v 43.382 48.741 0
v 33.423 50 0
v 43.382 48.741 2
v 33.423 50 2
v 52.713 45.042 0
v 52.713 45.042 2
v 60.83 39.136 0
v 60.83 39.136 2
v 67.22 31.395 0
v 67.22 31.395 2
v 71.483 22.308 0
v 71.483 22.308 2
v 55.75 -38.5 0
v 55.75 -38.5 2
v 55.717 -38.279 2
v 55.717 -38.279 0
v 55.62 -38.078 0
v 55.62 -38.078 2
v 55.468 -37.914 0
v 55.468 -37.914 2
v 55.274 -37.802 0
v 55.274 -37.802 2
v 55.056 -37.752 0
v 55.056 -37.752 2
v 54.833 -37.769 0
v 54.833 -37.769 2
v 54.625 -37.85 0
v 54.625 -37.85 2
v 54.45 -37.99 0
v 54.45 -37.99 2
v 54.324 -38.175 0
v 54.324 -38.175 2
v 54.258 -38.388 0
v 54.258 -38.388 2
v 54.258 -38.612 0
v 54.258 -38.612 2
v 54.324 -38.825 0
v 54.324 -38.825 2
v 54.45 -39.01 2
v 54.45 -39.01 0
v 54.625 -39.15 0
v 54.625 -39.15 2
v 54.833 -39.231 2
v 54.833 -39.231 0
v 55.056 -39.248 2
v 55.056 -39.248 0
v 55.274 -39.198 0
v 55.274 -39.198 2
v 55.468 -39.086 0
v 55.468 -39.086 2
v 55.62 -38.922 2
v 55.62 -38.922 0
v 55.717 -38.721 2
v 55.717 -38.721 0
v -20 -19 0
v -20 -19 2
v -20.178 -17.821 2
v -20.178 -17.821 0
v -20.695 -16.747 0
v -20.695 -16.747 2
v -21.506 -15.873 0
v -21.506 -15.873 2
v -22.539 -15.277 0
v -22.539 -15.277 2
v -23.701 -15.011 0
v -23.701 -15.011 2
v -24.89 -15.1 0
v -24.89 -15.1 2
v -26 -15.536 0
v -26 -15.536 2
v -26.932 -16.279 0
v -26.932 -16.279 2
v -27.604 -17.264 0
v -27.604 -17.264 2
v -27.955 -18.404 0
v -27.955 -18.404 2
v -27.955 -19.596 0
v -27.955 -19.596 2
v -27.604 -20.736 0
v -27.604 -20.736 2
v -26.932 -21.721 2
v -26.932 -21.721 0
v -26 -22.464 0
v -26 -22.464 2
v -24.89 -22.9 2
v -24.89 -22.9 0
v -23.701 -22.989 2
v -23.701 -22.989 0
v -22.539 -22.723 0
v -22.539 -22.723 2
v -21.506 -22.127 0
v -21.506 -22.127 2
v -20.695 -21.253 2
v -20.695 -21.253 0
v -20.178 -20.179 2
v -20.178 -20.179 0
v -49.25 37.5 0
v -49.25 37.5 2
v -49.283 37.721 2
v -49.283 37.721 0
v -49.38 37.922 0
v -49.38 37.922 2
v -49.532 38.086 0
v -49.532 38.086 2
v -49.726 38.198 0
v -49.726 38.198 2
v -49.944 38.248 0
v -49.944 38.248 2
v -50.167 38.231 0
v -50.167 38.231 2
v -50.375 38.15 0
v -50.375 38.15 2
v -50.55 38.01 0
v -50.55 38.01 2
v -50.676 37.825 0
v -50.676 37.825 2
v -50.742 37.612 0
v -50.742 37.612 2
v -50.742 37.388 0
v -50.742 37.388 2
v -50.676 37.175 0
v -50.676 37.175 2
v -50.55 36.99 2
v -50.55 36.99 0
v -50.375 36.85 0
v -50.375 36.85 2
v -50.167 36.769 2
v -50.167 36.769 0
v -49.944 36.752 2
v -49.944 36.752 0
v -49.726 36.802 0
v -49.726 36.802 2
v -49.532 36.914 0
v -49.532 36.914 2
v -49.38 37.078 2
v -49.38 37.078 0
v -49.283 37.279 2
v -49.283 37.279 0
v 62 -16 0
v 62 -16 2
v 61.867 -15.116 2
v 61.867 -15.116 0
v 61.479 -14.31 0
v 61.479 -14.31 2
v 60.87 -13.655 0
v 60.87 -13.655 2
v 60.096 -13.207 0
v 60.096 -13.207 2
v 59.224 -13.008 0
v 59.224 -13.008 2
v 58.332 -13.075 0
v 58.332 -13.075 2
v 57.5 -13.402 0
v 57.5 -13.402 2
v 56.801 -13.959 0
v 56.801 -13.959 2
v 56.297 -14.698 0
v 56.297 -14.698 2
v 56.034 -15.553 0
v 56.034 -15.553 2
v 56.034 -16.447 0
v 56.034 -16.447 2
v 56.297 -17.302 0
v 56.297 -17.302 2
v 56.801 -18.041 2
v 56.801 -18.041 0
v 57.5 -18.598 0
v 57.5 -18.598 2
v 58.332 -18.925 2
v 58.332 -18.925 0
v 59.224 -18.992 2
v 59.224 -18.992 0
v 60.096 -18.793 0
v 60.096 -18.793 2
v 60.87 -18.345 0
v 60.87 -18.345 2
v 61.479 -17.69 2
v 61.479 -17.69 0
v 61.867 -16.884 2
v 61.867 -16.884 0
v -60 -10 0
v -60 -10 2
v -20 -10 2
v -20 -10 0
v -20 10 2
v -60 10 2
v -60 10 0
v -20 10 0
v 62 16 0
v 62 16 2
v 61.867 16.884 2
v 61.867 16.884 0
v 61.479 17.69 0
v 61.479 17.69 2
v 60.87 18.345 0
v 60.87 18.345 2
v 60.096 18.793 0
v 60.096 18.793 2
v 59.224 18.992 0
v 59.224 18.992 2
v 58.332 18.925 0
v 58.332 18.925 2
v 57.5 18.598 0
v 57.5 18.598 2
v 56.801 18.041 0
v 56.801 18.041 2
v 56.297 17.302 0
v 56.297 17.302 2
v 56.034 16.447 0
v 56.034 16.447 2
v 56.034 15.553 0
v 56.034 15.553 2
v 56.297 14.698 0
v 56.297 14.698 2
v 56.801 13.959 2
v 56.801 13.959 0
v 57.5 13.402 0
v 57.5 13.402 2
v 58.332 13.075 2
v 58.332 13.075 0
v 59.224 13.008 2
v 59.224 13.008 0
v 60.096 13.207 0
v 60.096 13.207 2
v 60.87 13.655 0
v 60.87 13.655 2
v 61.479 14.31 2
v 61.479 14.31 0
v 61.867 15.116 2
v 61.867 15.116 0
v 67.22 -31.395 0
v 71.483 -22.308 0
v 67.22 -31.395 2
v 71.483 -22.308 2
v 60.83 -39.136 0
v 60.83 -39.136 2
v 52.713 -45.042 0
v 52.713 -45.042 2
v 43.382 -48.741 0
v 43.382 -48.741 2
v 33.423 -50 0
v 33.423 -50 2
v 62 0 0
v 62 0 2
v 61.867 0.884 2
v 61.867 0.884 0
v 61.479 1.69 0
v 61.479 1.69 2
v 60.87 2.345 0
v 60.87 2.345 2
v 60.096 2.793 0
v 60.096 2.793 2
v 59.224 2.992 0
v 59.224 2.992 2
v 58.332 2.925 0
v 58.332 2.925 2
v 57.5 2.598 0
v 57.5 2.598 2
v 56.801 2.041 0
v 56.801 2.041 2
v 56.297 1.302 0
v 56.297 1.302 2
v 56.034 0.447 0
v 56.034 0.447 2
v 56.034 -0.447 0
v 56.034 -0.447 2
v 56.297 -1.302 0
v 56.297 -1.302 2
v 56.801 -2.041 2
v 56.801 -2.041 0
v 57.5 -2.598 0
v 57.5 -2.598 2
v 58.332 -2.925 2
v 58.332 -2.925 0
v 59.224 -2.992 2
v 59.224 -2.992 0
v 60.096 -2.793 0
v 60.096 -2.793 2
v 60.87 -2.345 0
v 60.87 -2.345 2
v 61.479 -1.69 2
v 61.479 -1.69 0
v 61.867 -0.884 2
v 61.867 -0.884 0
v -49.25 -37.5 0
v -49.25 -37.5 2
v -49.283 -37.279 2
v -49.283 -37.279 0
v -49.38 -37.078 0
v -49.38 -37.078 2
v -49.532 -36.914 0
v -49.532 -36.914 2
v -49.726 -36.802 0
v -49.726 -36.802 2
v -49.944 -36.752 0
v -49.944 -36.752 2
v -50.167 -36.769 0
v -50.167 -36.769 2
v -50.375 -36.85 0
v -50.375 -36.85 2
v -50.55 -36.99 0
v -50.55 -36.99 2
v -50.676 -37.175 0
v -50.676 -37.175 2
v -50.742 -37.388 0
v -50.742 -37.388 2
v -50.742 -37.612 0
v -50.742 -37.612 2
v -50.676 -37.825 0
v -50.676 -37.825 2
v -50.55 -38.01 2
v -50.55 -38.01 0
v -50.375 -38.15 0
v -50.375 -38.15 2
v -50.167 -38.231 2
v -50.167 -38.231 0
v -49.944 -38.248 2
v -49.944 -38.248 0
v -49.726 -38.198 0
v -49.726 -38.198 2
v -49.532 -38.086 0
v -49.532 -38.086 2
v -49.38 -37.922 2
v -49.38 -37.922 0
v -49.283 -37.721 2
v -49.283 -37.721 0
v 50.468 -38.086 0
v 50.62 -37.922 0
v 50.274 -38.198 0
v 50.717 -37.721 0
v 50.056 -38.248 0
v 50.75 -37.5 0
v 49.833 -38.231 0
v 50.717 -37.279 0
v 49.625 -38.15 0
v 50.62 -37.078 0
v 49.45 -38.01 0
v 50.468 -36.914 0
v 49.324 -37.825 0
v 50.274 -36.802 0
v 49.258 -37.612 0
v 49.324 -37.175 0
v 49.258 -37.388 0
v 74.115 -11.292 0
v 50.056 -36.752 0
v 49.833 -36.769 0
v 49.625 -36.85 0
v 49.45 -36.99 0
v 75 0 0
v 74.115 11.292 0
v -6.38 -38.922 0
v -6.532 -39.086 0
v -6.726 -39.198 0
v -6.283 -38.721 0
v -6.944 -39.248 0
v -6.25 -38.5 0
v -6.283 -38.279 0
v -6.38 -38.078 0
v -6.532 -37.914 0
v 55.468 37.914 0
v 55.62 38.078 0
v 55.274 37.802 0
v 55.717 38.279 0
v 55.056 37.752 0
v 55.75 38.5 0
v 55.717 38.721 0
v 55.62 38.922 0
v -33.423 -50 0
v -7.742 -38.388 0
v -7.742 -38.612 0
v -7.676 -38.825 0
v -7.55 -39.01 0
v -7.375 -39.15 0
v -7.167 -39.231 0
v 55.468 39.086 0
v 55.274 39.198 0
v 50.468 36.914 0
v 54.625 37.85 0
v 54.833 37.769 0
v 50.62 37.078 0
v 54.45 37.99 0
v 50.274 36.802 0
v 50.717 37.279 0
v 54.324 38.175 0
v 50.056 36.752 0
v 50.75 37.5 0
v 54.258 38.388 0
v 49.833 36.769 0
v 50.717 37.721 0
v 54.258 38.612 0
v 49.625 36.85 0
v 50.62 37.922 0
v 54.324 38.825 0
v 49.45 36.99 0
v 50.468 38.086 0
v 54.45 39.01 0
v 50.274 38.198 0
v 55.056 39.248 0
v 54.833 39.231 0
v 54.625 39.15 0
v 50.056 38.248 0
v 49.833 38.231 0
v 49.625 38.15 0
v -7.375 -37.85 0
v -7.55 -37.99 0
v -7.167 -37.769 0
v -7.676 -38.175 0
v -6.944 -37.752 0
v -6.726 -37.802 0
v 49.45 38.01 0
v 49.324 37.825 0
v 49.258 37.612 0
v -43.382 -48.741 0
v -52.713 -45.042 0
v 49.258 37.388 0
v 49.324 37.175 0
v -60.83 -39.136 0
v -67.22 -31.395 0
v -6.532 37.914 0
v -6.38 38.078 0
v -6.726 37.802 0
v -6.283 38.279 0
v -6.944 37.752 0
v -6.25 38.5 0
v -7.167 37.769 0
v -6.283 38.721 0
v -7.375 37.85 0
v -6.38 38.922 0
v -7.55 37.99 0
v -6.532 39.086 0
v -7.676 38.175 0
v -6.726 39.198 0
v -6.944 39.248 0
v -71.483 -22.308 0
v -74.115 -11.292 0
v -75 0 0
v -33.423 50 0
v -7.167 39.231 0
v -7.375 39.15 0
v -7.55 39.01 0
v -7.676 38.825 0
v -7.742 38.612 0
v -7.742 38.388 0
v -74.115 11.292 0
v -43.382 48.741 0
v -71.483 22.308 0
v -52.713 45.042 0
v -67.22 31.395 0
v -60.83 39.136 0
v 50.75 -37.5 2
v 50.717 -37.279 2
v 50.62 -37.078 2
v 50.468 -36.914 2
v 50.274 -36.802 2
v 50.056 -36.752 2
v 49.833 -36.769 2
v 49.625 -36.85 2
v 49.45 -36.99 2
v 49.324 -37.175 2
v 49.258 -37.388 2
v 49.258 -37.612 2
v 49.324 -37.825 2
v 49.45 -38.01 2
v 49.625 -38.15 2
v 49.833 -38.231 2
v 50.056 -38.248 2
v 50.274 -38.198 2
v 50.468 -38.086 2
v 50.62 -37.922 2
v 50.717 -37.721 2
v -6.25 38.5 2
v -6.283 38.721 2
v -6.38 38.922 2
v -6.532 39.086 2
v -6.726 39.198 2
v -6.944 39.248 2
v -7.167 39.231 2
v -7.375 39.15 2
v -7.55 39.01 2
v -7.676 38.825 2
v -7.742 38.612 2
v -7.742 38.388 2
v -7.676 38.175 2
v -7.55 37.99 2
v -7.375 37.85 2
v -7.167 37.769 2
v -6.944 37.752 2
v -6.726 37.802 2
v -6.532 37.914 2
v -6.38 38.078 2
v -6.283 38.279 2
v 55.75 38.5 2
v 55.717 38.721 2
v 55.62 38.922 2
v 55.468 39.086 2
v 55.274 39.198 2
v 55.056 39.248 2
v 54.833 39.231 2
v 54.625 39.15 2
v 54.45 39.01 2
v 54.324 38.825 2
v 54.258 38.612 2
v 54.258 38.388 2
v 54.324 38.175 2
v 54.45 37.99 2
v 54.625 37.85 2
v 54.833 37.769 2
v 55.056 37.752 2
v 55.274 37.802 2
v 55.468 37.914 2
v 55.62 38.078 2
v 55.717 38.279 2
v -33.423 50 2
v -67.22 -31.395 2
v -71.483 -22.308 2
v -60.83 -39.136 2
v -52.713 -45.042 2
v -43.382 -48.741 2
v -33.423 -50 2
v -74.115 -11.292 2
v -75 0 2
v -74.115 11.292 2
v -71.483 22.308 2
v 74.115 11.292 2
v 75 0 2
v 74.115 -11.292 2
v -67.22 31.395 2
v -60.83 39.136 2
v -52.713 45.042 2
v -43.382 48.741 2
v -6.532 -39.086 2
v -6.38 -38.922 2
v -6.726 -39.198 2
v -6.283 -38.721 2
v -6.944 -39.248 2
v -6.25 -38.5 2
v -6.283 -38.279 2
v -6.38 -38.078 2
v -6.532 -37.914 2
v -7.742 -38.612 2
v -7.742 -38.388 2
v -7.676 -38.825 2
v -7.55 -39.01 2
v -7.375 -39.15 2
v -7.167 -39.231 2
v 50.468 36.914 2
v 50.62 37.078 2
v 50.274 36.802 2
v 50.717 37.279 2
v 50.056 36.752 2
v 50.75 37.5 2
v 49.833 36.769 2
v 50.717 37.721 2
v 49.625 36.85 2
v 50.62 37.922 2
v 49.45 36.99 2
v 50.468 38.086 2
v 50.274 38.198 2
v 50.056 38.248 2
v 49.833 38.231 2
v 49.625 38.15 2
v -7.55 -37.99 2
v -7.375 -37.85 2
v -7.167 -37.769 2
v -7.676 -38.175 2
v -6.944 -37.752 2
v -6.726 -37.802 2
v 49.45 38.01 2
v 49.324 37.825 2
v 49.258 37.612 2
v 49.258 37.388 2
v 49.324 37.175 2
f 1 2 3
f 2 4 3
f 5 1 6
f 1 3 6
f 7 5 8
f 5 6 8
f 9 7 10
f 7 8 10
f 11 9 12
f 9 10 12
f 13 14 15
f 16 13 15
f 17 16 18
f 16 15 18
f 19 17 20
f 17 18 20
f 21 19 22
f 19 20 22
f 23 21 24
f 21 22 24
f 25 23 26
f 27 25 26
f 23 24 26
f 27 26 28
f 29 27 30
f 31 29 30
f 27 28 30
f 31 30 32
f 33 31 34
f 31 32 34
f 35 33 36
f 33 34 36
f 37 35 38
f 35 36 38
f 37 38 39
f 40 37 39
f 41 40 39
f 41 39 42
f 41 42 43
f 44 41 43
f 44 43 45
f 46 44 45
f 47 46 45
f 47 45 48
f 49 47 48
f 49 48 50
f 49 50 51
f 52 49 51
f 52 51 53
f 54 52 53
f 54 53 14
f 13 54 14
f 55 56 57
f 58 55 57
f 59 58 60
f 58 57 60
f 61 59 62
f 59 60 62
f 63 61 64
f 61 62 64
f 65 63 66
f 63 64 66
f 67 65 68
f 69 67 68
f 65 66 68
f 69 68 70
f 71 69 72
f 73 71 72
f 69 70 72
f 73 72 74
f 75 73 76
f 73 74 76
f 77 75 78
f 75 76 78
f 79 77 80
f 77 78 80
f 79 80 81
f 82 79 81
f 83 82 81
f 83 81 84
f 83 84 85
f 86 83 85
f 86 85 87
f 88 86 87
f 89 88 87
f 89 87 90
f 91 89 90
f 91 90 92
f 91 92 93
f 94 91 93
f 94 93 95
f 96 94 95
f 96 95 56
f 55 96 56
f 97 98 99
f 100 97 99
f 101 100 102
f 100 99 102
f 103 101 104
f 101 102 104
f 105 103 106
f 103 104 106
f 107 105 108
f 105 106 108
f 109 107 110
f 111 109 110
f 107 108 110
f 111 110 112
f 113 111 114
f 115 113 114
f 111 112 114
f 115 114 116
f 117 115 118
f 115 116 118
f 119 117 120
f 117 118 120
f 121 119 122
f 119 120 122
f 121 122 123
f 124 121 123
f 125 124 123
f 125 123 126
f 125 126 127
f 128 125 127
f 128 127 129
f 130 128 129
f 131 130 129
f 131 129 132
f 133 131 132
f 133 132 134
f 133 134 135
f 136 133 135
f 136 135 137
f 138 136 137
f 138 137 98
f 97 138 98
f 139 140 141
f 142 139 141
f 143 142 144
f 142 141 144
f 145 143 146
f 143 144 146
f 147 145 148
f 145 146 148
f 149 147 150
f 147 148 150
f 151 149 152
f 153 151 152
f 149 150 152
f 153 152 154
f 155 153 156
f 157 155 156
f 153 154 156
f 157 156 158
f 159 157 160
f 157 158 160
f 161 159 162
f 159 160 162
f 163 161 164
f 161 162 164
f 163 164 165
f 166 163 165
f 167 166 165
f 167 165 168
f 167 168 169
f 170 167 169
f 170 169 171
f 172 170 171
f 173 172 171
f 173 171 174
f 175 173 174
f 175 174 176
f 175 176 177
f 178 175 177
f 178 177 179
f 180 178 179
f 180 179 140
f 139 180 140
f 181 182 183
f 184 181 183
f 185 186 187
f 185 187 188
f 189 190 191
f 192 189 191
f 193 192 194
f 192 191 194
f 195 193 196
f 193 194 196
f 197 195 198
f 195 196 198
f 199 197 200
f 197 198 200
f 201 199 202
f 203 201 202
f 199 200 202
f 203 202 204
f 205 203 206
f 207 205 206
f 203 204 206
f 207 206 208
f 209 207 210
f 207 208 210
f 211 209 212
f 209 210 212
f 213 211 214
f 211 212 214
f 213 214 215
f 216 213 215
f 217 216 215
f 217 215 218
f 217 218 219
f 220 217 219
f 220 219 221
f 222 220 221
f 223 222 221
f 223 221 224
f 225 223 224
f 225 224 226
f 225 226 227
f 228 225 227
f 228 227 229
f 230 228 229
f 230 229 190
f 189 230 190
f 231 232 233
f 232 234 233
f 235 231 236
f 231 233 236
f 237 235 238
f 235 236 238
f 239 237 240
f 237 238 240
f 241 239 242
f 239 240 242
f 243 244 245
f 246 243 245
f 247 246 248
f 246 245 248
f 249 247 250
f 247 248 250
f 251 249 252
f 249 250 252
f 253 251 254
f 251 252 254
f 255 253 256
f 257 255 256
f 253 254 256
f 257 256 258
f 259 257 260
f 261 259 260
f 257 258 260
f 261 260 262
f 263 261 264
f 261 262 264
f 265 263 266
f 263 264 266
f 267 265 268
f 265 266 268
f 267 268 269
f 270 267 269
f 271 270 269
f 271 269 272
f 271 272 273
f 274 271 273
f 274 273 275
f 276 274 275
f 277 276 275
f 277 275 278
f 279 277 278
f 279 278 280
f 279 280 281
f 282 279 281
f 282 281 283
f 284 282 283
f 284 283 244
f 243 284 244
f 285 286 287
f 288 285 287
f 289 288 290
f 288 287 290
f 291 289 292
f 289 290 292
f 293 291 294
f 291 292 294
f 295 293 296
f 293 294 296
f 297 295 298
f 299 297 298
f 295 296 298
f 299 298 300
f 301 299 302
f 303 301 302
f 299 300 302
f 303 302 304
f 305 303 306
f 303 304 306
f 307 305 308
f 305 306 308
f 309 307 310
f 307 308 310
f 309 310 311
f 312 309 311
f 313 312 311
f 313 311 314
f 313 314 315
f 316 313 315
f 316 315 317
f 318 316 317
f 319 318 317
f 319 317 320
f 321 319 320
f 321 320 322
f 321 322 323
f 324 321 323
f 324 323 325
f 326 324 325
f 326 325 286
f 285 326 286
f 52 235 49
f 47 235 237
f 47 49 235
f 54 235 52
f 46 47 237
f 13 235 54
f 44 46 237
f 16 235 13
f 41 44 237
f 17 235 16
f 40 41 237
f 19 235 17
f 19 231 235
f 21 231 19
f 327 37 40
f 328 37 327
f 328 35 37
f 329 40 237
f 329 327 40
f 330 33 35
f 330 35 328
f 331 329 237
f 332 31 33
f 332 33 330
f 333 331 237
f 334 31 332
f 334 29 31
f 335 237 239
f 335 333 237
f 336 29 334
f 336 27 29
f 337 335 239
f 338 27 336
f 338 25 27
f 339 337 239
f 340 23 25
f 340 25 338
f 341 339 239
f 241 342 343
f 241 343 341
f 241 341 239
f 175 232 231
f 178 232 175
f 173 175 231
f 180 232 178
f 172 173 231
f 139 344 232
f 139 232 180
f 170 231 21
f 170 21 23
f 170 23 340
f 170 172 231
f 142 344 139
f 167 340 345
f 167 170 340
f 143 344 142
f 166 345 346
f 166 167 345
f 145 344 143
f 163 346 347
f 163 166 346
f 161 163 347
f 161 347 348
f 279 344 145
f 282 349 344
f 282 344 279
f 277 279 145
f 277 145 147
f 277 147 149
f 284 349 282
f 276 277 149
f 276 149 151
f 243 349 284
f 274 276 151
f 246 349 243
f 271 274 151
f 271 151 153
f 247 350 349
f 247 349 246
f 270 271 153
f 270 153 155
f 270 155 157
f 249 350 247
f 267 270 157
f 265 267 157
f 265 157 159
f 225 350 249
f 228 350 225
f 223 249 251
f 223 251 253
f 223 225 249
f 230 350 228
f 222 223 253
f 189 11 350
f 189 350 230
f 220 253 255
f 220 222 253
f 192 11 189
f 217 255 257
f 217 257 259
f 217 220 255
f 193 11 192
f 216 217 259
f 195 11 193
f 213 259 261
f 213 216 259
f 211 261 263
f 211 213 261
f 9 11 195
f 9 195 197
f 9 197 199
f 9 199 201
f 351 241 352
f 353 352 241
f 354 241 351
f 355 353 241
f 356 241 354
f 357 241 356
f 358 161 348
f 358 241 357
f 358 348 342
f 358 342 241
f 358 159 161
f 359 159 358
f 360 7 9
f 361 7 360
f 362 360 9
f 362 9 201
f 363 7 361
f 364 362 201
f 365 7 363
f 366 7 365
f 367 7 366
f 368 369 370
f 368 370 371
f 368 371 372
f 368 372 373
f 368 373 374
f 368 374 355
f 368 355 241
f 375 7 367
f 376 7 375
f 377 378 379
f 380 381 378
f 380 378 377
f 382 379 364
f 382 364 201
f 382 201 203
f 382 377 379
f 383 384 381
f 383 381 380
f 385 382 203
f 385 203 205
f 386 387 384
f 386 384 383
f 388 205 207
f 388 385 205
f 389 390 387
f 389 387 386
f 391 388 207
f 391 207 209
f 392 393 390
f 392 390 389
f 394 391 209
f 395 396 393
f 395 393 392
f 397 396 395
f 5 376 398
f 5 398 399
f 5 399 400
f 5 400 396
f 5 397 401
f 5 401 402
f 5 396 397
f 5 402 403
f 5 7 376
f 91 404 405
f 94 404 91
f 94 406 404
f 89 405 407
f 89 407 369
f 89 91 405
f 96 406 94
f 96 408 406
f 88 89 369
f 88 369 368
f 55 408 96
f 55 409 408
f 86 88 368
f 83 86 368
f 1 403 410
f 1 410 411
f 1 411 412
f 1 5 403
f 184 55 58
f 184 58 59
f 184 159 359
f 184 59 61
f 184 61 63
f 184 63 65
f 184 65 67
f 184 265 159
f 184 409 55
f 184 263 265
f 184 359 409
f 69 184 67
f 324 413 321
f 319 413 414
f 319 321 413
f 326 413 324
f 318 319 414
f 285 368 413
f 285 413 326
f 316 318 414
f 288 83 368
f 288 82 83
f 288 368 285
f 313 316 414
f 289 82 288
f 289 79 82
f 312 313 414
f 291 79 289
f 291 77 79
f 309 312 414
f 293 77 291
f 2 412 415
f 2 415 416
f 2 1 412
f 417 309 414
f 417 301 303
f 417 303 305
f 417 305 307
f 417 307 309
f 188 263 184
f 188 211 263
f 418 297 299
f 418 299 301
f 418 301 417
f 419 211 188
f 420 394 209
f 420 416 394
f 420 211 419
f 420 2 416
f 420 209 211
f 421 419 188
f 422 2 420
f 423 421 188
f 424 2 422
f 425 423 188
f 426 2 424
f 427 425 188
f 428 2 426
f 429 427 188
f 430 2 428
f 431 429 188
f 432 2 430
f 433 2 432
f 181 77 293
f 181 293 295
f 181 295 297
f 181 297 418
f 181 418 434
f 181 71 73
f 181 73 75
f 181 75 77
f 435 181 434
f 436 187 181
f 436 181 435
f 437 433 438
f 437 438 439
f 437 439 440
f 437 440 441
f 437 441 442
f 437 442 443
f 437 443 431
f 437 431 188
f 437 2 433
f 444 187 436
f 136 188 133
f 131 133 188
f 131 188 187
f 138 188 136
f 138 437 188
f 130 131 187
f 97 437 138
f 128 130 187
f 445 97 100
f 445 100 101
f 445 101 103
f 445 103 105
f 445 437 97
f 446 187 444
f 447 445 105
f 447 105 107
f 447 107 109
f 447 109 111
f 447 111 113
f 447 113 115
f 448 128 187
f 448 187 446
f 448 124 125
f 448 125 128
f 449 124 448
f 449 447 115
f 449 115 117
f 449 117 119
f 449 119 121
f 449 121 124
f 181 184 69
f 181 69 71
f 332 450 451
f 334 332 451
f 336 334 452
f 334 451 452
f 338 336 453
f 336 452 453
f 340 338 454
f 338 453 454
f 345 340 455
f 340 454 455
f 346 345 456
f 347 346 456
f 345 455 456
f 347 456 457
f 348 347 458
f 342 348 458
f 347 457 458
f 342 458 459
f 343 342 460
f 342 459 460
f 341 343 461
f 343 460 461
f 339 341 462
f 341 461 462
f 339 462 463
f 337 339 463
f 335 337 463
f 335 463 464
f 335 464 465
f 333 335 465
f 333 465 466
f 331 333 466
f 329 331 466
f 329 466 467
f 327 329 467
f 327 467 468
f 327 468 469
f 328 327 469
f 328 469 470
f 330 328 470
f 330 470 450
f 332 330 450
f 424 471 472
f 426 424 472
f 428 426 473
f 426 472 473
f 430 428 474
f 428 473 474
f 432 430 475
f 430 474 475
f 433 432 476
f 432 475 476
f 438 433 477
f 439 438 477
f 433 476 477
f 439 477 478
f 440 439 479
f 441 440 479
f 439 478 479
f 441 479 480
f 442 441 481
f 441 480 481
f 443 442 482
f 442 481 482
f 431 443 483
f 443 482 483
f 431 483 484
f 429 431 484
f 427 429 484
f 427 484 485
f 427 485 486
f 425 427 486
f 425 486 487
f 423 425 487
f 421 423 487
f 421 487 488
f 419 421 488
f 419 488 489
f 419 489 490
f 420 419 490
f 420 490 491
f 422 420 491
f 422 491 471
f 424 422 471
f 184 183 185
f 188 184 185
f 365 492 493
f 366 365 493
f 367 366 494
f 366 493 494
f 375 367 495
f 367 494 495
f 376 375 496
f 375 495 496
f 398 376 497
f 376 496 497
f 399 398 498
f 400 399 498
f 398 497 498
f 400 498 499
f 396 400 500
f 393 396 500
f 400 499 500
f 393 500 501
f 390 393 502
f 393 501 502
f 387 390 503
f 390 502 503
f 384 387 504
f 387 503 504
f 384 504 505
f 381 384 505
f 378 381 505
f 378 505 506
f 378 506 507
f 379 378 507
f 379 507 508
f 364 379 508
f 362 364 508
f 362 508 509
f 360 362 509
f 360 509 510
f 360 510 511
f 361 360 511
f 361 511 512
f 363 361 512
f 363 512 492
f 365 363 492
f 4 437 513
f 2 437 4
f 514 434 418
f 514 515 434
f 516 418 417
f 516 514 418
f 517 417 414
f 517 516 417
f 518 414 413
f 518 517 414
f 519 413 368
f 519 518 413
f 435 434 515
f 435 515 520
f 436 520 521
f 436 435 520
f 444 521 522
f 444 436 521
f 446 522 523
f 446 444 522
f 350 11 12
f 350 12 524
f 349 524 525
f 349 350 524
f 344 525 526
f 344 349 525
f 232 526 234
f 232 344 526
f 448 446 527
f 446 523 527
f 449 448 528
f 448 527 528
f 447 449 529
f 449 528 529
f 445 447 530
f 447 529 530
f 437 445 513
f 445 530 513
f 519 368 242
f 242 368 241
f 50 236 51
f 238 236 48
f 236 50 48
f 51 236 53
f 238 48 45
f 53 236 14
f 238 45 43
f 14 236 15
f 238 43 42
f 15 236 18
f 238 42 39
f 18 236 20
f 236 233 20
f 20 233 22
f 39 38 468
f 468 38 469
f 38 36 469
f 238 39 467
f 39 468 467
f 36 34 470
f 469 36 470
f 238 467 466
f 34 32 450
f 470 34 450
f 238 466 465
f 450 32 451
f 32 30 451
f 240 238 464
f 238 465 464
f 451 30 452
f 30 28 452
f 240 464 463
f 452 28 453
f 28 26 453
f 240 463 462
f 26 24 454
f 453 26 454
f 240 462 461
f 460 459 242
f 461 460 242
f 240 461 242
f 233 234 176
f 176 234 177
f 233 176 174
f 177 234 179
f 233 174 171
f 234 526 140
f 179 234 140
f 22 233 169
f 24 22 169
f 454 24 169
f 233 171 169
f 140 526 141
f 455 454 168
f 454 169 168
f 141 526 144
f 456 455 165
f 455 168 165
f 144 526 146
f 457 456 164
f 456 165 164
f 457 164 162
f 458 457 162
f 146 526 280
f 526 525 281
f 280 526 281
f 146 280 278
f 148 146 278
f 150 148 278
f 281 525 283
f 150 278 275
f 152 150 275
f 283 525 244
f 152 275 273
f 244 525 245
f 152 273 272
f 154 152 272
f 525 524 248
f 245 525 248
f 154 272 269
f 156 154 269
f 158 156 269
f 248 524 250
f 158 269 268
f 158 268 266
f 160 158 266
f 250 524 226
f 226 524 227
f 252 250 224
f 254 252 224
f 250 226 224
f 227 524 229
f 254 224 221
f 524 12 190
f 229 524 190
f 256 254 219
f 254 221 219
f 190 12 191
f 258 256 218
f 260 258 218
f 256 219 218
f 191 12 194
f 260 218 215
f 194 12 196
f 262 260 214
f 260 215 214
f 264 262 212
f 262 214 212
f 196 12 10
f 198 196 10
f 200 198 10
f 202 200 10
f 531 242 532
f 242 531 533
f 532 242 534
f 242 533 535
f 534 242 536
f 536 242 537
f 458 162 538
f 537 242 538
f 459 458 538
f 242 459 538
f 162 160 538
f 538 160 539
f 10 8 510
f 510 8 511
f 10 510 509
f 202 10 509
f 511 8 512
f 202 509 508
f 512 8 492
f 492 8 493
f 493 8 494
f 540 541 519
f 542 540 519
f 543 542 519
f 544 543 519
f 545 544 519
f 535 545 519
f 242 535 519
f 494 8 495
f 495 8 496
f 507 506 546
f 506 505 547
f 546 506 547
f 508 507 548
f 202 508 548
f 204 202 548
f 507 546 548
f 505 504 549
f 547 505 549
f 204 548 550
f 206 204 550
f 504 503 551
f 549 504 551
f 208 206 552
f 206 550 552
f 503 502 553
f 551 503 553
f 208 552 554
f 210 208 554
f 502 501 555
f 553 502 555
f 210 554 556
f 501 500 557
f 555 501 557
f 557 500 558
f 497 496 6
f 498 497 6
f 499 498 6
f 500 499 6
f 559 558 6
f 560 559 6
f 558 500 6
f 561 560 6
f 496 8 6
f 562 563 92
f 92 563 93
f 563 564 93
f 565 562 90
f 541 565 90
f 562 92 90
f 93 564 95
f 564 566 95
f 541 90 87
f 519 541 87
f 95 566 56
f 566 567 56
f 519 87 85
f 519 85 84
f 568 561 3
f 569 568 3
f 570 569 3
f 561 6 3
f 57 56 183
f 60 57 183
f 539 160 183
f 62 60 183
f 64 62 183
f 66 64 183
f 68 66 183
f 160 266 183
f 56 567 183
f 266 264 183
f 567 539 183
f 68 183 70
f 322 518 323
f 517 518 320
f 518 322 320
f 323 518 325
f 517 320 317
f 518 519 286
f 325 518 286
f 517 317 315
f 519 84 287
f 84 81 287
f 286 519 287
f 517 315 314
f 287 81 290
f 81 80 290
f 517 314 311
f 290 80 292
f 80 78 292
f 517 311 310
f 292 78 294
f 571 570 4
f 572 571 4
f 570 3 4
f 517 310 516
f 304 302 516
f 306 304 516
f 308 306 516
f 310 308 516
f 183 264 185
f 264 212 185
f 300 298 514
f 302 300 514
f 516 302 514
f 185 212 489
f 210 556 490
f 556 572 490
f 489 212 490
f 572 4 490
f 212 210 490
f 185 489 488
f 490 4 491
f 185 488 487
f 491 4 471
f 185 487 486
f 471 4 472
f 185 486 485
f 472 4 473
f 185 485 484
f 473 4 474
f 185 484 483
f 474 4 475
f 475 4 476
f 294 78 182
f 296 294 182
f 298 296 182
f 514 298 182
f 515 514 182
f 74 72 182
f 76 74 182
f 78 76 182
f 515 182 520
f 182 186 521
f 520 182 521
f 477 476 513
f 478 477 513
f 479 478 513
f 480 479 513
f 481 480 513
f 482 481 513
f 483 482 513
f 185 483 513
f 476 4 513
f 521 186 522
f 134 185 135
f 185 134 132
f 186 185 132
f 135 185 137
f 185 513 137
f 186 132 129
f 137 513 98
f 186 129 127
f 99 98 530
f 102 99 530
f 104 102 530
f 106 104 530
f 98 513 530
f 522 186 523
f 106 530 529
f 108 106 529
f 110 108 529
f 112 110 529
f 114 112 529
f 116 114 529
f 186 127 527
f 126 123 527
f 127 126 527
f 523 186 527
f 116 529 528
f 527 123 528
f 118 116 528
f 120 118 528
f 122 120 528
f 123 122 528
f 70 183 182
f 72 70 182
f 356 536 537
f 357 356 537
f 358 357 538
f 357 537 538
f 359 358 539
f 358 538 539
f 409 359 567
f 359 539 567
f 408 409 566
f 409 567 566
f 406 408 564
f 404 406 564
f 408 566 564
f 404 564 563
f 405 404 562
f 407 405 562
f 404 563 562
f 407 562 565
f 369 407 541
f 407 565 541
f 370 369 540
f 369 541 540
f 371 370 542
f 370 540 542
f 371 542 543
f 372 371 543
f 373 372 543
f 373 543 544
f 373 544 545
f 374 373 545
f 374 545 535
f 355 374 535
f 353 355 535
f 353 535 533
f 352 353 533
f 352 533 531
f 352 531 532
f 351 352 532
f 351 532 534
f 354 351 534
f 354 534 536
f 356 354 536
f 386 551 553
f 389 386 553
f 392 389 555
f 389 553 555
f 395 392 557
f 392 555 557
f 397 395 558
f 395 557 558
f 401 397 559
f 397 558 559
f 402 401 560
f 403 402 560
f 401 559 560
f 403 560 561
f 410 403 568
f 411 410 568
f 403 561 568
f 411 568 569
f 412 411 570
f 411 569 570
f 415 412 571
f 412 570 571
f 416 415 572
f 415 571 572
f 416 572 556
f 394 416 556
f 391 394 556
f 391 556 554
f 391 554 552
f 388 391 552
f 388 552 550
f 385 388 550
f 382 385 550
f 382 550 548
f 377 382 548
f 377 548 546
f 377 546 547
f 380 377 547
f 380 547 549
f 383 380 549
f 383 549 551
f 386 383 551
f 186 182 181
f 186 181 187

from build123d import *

# Parameters (mm, degrees)
SKETCH1_W           = 110
SKETCH1_H           = 100
BOSS_EXTRUDE1_DEPTH = 2
FILLET2_R           = 40
SKETCH6_R           = 4
SKETCH6_W           = 40
SKETCH6_H           = 20
CUT_EXTRUDE4_DEPTH  = 3
SKETCH7_R           = 0.75
SKETCH7_R_2         = 3
CUT_EXTRUDE7_DEPTH  = 10
SKETCH8_R           = 0.75
CUT_EXTRUDE8_DEPTH  = 10


with BuildPart() as part:
    # Sketch1 → Boss-Extrude1 (new body)
    with BuildSketch(Plane.XY):
        with BuildLine():
            Line((-55, 50), (-55, -50))
            ThreePointArc((-55, -50), (-75, 0), (-55, 50))
        make_face()
        Rectangle(SKETCH1_W, SKETCH1_H)
        with BuildLine():
            ThreePointArc((55, 50), (75, 0), (55, -50))
            Line((55, -50), (55, 50))
        make_face()
    extrude(amount=BOSS_EXTRUDE1_DEPTH)

    # Fillet2
    fillet2_edges = [part.edges().sort_by_distance(p)[0] for p in [
        (-55, 50, 1),
        (55, 50, 1),
        (55, -50, 1),
        (-55, -50, 1),
    ]]
    fillet(fillet2_edges, radius=FILLET2_R)

    # Sketch6 → Cut-Extrude4 (cut)
    with BuildSketch(Plane.XY.offset(2)):
        with Locations((-24, -19)):
            Circle(SKETCH6_R)
        with Locations((-40, 0)):
            Rectangle(SKETCH6_W, SKETCH6_H)
    extrude(amount=-CUT_EXTRUDE4_DEPTH, mode=Mode.SUBTRACT)

    # Sketch7 → Cut-Extrude7 (cut)
    with BuildSketch(Plane.XY.offset(2)):
        with Locations((-7, 38.5)):
            Circle(SKETCH7_R)
        with Locations((55, 38.5)):
            Circle(SKETCH7_R)
        with Locations((55, -38.5)):
            Circle(SKETCH7_R)
        with Locations((-7, -38.5)):
            Circle(SKETCH7_R)
        with Locations((59, 16)):
            Circle(SKETCH7_R_2)
        with Locations((59, -16)):
            Circle(SKETCH7_R_2)
        with Locations((59, 0)):
            Circle(SKETCH7_R_2)
    extrude(amount=-CUT_EXTRUDE7_DEPTH, mode=Mode.SUBTRACT)

    # Sketch8 → Cut-Extrude8 (cut)
    with BuildSketch(Plane.XY.offset(2)):
        with Locations((-50, 37.5)):
            Circle(SKETCH8_R)
        with Locations((50, 37.5)):
            Circle(SKETCH8_R)
        with Locations((50, -37.5)):
            Circle(SKETCH8_R)
        with Locations((-50, -37.5)):
            Circle(SKETCH8_R)
    extrude(amount=-CUT_EXTRUDE8_DEPTH, mode=Mode.SUBTRACT)


solid = part.part
